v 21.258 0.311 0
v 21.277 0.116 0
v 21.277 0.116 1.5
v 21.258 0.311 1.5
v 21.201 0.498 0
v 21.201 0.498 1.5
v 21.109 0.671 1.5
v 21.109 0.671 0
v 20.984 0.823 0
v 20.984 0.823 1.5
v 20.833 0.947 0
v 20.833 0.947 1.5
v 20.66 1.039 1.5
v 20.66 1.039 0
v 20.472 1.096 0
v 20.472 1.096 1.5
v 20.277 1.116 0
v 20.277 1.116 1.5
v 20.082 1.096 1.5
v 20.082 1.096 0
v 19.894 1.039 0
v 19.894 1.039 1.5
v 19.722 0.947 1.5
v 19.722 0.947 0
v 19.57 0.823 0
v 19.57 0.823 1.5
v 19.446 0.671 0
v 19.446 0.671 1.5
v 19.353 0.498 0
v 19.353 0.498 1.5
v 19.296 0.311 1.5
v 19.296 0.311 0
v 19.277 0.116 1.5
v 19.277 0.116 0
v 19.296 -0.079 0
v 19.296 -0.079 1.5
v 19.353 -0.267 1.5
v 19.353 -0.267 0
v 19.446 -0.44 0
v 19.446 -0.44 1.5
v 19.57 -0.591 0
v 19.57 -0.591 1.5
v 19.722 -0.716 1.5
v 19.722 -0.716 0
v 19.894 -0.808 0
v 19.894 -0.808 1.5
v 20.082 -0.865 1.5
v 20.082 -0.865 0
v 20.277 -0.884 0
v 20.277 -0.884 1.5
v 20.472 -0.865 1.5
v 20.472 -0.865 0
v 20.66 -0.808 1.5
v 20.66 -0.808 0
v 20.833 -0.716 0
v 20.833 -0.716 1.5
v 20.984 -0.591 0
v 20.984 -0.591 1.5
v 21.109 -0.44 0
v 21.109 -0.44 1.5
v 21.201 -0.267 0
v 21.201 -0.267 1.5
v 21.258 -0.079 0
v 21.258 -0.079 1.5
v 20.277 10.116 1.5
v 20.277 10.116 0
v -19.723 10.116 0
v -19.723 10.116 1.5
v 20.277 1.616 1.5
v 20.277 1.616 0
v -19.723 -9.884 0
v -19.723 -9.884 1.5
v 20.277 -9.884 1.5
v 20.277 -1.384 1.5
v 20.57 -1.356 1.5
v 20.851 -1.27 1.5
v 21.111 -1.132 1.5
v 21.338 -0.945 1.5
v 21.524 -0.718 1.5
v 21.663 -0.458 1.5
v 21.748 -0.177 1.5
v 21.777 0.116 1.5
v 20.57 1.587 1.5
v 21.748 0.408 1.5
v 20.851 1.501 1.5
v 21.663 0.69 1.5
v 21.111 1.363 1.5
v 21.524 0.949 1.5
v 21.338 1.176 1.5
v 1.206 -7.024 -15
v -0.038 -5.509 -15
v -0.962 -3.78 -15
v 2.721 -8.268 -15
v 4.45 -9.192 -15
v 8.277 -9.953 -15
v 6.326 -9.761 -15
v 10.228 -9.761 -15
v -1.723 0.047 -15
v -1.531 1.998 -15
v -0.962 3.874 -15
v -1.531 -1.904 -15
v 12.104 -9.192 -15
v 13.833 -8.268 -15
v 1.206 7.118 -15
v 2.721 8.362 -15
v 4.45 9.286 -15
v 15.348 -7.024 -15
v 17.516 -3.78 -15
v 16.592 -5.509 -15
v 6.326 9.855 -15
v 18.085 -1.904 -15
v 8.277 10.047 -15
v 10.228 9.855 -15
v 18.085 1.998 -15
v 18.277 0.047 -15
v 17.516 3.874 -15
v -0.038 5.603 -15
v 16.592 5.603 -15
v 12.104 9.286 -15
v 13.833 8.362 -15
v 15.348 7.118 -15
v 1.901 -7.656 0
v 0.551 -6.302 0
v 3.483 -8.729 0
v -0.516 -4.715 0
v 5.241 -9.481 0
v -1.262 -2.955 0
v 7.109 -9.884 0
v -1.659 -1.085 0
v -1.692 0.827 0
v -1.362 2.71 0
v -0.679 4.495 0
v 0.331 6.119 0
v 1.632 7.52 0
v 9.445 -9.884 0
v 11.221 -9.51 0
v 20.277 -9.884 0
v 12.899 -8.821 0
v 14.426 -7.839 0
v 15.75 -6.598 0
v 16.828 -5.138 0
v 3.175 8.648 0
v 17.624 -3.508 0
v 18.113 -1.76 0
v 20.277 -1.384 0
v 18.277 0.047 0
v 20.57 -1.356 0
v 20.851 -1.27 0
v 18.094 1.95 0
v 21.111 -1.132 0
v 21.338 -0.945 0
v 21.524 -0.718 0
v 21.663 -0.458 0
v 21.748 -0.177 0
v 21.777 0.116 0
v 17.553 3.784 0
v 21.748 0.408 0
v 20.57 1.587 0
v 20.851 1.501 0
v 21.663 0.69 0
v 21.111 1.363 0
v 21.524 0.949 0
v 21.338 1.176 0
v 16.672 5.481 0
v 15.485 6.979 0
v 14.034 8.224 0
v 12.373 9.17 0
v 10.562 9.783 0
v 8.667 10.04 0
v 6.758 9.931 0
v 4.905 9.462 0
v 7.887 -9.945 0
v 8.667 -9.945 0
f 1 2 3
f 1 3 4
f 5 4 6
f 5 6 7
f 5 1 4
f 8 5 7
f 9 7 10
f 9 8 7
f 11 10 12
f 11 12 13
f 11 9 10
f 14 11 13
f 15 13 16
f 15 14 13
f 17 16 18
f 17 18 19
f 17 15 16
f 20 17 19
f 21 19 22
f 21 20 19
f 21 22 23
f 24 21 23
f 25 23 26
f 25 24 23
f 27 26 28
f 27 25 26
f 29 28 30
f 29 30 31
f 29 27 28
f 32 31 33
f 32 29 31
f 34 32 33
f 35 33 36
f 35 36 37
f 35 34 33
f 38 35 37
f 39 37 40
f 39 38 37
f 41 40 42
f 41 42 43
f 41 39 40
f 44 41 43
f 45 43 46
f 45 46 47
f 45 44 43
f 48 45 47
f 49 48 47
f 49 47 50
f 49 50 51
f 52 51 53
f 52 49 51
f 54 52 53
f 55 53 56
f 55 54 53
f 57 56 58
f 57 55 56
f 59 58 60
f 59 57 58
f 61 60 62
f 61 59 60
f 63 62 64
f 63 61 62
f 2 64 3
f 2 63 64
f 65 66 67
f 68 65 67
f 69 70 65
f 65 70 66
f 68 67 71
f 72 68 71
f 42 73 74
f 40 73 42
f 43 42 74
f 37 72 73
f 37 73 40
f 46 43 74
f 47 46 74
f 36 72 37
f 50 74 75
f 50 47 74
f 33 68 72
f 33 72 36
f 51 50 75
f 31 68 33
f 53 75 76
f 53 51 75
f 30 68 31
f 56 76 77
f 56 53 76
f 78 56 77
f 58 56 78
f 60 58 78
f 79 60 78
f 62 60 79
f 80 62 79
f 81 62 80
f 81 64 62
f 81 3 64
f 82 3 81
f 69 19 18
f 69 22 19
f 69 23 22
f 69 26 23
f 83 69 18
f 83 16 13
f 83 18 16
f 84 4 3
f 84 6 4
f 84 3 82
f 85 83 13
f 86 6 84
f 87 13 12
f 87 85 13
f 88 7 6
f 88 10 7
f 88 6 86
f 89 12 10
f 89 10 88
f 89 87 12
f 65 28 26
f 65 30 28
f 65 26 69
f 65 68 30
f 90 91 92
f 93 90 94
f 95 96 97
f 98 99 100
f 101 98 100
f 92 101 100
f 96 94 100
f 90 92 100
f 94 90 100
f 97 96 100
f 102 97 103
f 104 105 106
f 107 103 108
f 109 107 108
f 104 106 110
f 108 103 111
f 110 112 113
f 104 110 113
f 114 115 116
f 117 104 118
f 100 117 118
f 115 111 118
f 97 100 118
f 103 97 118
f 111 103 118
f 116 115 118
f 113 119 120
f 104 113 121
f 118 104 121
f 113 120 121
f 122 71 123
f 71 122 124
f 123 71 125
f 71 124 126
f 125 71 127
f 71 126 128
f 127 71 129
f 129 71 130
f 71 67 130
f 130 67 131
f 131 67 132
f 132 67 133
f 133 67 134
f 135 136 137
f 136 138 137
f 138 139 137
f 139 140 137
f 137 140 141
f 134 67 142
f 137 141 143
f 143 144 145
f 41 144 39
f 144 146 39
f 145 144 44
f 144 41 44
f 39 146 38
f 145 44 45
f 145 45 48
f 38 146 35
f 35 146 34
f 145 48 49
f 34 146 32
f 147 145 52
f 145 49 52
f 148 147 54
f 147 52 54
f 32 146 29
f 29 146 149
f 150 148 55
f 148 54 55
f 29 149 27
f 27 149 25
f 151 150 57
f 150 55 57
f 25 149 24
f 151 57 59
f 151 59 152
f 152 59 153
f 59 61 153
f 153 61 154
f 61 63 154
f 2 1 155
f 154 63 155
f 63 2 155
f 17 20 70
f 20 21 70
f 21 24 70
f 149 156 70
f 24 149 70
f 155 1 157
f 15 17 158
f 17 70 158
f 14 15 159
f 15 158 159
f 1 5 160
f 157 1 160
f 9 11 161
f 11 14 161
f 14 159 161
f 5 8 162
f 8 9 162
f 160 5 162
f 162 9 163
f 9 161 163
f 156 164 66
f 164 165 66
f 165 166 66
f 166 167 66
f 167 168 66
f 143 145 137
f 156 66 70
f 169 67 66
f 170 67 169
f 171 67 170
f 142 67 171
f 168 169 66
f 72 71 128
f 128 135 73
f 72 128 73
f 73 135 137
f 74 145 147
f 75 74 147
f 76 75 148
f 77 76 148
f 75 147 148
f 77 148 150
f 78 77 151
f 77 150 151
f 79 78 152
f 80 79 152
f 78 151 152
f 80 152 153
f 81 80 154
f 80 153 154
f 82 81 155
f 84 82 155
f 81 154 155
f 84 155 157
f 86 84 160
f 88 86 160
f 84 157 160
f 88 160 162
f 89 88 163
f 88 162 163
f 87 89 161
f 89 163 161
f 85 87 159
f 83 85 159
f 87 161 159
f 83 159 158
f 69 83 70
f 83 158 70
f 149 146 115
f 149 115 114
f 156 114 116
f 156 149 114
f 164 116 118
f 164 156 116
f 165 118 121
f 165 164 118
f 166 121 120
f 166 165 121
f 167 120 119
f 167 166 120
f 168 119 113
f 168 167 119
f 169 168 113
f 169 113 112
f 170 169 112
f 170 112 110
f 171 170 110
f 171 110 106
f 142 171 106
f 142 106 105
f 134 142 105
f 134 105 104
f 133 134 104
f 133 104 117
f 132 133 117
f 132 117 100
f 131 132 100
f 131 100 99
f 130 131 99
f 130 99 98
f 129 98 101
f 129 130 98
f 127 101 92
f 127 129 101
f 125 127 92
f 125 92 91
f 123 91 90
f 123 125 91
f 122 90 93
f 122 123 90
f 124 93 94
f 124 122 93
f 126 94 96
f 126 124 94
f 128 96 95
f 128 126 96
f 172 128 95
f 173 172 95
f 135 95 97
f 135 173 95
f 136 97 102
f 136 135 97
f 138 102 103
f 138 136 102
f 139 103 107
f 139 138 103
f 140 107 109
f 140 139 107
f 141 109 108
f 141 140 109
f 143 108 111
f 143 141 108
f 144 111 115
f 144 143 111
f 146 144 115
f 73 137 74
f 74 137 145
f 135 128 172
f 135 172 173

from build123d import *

# Parameters (mm, degrees)
ESQUISSE1_R        = 1
BOSS_EXTRU_2_DEPTH = 1.5
ESQUISSE2_R        = 10
BOSS_EXTRU_3_DEPTH = 15


with BuildPart() as part:
    # Esquisse1 → Boss.-Extru.2 (new body)
    with BuildSketch(Plane.XY):
        with BuildLine():
            Line((20.277172368, -9.884393064), (20.277172368, -1.384393064))
            ThreePointArc((20.277172368, -1.384393064), (21.777172368, 0.115606936), (20.277172368, 1.615606936))
            Line((20.277172368, 1.615606936), (20.277172368, 10.115606936))
            Line((20.277172368, 10.115606936), (-19.722827632, 10.115606936))
            Line((-19.722827632, 10.115606936), (-19.722827632, -9.884393064))
            Line((-19.722827632, -9.884393064), (20.277172368, -9.884393064))
        make_face()
        with Locations((20.277172368, 0.115606936)):
            Circle(ESQUISSE1_R, mode=Mode.SUBTRACT)
    extrude(amount=BOSS_EXTRU_2_DEPTH)

    # Esquisse2 → Boss.-Extru.3 (add)
    with BuildSketch(Plane.XY):
        with Locations((8.277172368, 0.047190926)):
            Circle(ESQUISSE2_R)
    extrude(amount=-BOSS_EXTRU_3_DEPTH)


solid = part.part
